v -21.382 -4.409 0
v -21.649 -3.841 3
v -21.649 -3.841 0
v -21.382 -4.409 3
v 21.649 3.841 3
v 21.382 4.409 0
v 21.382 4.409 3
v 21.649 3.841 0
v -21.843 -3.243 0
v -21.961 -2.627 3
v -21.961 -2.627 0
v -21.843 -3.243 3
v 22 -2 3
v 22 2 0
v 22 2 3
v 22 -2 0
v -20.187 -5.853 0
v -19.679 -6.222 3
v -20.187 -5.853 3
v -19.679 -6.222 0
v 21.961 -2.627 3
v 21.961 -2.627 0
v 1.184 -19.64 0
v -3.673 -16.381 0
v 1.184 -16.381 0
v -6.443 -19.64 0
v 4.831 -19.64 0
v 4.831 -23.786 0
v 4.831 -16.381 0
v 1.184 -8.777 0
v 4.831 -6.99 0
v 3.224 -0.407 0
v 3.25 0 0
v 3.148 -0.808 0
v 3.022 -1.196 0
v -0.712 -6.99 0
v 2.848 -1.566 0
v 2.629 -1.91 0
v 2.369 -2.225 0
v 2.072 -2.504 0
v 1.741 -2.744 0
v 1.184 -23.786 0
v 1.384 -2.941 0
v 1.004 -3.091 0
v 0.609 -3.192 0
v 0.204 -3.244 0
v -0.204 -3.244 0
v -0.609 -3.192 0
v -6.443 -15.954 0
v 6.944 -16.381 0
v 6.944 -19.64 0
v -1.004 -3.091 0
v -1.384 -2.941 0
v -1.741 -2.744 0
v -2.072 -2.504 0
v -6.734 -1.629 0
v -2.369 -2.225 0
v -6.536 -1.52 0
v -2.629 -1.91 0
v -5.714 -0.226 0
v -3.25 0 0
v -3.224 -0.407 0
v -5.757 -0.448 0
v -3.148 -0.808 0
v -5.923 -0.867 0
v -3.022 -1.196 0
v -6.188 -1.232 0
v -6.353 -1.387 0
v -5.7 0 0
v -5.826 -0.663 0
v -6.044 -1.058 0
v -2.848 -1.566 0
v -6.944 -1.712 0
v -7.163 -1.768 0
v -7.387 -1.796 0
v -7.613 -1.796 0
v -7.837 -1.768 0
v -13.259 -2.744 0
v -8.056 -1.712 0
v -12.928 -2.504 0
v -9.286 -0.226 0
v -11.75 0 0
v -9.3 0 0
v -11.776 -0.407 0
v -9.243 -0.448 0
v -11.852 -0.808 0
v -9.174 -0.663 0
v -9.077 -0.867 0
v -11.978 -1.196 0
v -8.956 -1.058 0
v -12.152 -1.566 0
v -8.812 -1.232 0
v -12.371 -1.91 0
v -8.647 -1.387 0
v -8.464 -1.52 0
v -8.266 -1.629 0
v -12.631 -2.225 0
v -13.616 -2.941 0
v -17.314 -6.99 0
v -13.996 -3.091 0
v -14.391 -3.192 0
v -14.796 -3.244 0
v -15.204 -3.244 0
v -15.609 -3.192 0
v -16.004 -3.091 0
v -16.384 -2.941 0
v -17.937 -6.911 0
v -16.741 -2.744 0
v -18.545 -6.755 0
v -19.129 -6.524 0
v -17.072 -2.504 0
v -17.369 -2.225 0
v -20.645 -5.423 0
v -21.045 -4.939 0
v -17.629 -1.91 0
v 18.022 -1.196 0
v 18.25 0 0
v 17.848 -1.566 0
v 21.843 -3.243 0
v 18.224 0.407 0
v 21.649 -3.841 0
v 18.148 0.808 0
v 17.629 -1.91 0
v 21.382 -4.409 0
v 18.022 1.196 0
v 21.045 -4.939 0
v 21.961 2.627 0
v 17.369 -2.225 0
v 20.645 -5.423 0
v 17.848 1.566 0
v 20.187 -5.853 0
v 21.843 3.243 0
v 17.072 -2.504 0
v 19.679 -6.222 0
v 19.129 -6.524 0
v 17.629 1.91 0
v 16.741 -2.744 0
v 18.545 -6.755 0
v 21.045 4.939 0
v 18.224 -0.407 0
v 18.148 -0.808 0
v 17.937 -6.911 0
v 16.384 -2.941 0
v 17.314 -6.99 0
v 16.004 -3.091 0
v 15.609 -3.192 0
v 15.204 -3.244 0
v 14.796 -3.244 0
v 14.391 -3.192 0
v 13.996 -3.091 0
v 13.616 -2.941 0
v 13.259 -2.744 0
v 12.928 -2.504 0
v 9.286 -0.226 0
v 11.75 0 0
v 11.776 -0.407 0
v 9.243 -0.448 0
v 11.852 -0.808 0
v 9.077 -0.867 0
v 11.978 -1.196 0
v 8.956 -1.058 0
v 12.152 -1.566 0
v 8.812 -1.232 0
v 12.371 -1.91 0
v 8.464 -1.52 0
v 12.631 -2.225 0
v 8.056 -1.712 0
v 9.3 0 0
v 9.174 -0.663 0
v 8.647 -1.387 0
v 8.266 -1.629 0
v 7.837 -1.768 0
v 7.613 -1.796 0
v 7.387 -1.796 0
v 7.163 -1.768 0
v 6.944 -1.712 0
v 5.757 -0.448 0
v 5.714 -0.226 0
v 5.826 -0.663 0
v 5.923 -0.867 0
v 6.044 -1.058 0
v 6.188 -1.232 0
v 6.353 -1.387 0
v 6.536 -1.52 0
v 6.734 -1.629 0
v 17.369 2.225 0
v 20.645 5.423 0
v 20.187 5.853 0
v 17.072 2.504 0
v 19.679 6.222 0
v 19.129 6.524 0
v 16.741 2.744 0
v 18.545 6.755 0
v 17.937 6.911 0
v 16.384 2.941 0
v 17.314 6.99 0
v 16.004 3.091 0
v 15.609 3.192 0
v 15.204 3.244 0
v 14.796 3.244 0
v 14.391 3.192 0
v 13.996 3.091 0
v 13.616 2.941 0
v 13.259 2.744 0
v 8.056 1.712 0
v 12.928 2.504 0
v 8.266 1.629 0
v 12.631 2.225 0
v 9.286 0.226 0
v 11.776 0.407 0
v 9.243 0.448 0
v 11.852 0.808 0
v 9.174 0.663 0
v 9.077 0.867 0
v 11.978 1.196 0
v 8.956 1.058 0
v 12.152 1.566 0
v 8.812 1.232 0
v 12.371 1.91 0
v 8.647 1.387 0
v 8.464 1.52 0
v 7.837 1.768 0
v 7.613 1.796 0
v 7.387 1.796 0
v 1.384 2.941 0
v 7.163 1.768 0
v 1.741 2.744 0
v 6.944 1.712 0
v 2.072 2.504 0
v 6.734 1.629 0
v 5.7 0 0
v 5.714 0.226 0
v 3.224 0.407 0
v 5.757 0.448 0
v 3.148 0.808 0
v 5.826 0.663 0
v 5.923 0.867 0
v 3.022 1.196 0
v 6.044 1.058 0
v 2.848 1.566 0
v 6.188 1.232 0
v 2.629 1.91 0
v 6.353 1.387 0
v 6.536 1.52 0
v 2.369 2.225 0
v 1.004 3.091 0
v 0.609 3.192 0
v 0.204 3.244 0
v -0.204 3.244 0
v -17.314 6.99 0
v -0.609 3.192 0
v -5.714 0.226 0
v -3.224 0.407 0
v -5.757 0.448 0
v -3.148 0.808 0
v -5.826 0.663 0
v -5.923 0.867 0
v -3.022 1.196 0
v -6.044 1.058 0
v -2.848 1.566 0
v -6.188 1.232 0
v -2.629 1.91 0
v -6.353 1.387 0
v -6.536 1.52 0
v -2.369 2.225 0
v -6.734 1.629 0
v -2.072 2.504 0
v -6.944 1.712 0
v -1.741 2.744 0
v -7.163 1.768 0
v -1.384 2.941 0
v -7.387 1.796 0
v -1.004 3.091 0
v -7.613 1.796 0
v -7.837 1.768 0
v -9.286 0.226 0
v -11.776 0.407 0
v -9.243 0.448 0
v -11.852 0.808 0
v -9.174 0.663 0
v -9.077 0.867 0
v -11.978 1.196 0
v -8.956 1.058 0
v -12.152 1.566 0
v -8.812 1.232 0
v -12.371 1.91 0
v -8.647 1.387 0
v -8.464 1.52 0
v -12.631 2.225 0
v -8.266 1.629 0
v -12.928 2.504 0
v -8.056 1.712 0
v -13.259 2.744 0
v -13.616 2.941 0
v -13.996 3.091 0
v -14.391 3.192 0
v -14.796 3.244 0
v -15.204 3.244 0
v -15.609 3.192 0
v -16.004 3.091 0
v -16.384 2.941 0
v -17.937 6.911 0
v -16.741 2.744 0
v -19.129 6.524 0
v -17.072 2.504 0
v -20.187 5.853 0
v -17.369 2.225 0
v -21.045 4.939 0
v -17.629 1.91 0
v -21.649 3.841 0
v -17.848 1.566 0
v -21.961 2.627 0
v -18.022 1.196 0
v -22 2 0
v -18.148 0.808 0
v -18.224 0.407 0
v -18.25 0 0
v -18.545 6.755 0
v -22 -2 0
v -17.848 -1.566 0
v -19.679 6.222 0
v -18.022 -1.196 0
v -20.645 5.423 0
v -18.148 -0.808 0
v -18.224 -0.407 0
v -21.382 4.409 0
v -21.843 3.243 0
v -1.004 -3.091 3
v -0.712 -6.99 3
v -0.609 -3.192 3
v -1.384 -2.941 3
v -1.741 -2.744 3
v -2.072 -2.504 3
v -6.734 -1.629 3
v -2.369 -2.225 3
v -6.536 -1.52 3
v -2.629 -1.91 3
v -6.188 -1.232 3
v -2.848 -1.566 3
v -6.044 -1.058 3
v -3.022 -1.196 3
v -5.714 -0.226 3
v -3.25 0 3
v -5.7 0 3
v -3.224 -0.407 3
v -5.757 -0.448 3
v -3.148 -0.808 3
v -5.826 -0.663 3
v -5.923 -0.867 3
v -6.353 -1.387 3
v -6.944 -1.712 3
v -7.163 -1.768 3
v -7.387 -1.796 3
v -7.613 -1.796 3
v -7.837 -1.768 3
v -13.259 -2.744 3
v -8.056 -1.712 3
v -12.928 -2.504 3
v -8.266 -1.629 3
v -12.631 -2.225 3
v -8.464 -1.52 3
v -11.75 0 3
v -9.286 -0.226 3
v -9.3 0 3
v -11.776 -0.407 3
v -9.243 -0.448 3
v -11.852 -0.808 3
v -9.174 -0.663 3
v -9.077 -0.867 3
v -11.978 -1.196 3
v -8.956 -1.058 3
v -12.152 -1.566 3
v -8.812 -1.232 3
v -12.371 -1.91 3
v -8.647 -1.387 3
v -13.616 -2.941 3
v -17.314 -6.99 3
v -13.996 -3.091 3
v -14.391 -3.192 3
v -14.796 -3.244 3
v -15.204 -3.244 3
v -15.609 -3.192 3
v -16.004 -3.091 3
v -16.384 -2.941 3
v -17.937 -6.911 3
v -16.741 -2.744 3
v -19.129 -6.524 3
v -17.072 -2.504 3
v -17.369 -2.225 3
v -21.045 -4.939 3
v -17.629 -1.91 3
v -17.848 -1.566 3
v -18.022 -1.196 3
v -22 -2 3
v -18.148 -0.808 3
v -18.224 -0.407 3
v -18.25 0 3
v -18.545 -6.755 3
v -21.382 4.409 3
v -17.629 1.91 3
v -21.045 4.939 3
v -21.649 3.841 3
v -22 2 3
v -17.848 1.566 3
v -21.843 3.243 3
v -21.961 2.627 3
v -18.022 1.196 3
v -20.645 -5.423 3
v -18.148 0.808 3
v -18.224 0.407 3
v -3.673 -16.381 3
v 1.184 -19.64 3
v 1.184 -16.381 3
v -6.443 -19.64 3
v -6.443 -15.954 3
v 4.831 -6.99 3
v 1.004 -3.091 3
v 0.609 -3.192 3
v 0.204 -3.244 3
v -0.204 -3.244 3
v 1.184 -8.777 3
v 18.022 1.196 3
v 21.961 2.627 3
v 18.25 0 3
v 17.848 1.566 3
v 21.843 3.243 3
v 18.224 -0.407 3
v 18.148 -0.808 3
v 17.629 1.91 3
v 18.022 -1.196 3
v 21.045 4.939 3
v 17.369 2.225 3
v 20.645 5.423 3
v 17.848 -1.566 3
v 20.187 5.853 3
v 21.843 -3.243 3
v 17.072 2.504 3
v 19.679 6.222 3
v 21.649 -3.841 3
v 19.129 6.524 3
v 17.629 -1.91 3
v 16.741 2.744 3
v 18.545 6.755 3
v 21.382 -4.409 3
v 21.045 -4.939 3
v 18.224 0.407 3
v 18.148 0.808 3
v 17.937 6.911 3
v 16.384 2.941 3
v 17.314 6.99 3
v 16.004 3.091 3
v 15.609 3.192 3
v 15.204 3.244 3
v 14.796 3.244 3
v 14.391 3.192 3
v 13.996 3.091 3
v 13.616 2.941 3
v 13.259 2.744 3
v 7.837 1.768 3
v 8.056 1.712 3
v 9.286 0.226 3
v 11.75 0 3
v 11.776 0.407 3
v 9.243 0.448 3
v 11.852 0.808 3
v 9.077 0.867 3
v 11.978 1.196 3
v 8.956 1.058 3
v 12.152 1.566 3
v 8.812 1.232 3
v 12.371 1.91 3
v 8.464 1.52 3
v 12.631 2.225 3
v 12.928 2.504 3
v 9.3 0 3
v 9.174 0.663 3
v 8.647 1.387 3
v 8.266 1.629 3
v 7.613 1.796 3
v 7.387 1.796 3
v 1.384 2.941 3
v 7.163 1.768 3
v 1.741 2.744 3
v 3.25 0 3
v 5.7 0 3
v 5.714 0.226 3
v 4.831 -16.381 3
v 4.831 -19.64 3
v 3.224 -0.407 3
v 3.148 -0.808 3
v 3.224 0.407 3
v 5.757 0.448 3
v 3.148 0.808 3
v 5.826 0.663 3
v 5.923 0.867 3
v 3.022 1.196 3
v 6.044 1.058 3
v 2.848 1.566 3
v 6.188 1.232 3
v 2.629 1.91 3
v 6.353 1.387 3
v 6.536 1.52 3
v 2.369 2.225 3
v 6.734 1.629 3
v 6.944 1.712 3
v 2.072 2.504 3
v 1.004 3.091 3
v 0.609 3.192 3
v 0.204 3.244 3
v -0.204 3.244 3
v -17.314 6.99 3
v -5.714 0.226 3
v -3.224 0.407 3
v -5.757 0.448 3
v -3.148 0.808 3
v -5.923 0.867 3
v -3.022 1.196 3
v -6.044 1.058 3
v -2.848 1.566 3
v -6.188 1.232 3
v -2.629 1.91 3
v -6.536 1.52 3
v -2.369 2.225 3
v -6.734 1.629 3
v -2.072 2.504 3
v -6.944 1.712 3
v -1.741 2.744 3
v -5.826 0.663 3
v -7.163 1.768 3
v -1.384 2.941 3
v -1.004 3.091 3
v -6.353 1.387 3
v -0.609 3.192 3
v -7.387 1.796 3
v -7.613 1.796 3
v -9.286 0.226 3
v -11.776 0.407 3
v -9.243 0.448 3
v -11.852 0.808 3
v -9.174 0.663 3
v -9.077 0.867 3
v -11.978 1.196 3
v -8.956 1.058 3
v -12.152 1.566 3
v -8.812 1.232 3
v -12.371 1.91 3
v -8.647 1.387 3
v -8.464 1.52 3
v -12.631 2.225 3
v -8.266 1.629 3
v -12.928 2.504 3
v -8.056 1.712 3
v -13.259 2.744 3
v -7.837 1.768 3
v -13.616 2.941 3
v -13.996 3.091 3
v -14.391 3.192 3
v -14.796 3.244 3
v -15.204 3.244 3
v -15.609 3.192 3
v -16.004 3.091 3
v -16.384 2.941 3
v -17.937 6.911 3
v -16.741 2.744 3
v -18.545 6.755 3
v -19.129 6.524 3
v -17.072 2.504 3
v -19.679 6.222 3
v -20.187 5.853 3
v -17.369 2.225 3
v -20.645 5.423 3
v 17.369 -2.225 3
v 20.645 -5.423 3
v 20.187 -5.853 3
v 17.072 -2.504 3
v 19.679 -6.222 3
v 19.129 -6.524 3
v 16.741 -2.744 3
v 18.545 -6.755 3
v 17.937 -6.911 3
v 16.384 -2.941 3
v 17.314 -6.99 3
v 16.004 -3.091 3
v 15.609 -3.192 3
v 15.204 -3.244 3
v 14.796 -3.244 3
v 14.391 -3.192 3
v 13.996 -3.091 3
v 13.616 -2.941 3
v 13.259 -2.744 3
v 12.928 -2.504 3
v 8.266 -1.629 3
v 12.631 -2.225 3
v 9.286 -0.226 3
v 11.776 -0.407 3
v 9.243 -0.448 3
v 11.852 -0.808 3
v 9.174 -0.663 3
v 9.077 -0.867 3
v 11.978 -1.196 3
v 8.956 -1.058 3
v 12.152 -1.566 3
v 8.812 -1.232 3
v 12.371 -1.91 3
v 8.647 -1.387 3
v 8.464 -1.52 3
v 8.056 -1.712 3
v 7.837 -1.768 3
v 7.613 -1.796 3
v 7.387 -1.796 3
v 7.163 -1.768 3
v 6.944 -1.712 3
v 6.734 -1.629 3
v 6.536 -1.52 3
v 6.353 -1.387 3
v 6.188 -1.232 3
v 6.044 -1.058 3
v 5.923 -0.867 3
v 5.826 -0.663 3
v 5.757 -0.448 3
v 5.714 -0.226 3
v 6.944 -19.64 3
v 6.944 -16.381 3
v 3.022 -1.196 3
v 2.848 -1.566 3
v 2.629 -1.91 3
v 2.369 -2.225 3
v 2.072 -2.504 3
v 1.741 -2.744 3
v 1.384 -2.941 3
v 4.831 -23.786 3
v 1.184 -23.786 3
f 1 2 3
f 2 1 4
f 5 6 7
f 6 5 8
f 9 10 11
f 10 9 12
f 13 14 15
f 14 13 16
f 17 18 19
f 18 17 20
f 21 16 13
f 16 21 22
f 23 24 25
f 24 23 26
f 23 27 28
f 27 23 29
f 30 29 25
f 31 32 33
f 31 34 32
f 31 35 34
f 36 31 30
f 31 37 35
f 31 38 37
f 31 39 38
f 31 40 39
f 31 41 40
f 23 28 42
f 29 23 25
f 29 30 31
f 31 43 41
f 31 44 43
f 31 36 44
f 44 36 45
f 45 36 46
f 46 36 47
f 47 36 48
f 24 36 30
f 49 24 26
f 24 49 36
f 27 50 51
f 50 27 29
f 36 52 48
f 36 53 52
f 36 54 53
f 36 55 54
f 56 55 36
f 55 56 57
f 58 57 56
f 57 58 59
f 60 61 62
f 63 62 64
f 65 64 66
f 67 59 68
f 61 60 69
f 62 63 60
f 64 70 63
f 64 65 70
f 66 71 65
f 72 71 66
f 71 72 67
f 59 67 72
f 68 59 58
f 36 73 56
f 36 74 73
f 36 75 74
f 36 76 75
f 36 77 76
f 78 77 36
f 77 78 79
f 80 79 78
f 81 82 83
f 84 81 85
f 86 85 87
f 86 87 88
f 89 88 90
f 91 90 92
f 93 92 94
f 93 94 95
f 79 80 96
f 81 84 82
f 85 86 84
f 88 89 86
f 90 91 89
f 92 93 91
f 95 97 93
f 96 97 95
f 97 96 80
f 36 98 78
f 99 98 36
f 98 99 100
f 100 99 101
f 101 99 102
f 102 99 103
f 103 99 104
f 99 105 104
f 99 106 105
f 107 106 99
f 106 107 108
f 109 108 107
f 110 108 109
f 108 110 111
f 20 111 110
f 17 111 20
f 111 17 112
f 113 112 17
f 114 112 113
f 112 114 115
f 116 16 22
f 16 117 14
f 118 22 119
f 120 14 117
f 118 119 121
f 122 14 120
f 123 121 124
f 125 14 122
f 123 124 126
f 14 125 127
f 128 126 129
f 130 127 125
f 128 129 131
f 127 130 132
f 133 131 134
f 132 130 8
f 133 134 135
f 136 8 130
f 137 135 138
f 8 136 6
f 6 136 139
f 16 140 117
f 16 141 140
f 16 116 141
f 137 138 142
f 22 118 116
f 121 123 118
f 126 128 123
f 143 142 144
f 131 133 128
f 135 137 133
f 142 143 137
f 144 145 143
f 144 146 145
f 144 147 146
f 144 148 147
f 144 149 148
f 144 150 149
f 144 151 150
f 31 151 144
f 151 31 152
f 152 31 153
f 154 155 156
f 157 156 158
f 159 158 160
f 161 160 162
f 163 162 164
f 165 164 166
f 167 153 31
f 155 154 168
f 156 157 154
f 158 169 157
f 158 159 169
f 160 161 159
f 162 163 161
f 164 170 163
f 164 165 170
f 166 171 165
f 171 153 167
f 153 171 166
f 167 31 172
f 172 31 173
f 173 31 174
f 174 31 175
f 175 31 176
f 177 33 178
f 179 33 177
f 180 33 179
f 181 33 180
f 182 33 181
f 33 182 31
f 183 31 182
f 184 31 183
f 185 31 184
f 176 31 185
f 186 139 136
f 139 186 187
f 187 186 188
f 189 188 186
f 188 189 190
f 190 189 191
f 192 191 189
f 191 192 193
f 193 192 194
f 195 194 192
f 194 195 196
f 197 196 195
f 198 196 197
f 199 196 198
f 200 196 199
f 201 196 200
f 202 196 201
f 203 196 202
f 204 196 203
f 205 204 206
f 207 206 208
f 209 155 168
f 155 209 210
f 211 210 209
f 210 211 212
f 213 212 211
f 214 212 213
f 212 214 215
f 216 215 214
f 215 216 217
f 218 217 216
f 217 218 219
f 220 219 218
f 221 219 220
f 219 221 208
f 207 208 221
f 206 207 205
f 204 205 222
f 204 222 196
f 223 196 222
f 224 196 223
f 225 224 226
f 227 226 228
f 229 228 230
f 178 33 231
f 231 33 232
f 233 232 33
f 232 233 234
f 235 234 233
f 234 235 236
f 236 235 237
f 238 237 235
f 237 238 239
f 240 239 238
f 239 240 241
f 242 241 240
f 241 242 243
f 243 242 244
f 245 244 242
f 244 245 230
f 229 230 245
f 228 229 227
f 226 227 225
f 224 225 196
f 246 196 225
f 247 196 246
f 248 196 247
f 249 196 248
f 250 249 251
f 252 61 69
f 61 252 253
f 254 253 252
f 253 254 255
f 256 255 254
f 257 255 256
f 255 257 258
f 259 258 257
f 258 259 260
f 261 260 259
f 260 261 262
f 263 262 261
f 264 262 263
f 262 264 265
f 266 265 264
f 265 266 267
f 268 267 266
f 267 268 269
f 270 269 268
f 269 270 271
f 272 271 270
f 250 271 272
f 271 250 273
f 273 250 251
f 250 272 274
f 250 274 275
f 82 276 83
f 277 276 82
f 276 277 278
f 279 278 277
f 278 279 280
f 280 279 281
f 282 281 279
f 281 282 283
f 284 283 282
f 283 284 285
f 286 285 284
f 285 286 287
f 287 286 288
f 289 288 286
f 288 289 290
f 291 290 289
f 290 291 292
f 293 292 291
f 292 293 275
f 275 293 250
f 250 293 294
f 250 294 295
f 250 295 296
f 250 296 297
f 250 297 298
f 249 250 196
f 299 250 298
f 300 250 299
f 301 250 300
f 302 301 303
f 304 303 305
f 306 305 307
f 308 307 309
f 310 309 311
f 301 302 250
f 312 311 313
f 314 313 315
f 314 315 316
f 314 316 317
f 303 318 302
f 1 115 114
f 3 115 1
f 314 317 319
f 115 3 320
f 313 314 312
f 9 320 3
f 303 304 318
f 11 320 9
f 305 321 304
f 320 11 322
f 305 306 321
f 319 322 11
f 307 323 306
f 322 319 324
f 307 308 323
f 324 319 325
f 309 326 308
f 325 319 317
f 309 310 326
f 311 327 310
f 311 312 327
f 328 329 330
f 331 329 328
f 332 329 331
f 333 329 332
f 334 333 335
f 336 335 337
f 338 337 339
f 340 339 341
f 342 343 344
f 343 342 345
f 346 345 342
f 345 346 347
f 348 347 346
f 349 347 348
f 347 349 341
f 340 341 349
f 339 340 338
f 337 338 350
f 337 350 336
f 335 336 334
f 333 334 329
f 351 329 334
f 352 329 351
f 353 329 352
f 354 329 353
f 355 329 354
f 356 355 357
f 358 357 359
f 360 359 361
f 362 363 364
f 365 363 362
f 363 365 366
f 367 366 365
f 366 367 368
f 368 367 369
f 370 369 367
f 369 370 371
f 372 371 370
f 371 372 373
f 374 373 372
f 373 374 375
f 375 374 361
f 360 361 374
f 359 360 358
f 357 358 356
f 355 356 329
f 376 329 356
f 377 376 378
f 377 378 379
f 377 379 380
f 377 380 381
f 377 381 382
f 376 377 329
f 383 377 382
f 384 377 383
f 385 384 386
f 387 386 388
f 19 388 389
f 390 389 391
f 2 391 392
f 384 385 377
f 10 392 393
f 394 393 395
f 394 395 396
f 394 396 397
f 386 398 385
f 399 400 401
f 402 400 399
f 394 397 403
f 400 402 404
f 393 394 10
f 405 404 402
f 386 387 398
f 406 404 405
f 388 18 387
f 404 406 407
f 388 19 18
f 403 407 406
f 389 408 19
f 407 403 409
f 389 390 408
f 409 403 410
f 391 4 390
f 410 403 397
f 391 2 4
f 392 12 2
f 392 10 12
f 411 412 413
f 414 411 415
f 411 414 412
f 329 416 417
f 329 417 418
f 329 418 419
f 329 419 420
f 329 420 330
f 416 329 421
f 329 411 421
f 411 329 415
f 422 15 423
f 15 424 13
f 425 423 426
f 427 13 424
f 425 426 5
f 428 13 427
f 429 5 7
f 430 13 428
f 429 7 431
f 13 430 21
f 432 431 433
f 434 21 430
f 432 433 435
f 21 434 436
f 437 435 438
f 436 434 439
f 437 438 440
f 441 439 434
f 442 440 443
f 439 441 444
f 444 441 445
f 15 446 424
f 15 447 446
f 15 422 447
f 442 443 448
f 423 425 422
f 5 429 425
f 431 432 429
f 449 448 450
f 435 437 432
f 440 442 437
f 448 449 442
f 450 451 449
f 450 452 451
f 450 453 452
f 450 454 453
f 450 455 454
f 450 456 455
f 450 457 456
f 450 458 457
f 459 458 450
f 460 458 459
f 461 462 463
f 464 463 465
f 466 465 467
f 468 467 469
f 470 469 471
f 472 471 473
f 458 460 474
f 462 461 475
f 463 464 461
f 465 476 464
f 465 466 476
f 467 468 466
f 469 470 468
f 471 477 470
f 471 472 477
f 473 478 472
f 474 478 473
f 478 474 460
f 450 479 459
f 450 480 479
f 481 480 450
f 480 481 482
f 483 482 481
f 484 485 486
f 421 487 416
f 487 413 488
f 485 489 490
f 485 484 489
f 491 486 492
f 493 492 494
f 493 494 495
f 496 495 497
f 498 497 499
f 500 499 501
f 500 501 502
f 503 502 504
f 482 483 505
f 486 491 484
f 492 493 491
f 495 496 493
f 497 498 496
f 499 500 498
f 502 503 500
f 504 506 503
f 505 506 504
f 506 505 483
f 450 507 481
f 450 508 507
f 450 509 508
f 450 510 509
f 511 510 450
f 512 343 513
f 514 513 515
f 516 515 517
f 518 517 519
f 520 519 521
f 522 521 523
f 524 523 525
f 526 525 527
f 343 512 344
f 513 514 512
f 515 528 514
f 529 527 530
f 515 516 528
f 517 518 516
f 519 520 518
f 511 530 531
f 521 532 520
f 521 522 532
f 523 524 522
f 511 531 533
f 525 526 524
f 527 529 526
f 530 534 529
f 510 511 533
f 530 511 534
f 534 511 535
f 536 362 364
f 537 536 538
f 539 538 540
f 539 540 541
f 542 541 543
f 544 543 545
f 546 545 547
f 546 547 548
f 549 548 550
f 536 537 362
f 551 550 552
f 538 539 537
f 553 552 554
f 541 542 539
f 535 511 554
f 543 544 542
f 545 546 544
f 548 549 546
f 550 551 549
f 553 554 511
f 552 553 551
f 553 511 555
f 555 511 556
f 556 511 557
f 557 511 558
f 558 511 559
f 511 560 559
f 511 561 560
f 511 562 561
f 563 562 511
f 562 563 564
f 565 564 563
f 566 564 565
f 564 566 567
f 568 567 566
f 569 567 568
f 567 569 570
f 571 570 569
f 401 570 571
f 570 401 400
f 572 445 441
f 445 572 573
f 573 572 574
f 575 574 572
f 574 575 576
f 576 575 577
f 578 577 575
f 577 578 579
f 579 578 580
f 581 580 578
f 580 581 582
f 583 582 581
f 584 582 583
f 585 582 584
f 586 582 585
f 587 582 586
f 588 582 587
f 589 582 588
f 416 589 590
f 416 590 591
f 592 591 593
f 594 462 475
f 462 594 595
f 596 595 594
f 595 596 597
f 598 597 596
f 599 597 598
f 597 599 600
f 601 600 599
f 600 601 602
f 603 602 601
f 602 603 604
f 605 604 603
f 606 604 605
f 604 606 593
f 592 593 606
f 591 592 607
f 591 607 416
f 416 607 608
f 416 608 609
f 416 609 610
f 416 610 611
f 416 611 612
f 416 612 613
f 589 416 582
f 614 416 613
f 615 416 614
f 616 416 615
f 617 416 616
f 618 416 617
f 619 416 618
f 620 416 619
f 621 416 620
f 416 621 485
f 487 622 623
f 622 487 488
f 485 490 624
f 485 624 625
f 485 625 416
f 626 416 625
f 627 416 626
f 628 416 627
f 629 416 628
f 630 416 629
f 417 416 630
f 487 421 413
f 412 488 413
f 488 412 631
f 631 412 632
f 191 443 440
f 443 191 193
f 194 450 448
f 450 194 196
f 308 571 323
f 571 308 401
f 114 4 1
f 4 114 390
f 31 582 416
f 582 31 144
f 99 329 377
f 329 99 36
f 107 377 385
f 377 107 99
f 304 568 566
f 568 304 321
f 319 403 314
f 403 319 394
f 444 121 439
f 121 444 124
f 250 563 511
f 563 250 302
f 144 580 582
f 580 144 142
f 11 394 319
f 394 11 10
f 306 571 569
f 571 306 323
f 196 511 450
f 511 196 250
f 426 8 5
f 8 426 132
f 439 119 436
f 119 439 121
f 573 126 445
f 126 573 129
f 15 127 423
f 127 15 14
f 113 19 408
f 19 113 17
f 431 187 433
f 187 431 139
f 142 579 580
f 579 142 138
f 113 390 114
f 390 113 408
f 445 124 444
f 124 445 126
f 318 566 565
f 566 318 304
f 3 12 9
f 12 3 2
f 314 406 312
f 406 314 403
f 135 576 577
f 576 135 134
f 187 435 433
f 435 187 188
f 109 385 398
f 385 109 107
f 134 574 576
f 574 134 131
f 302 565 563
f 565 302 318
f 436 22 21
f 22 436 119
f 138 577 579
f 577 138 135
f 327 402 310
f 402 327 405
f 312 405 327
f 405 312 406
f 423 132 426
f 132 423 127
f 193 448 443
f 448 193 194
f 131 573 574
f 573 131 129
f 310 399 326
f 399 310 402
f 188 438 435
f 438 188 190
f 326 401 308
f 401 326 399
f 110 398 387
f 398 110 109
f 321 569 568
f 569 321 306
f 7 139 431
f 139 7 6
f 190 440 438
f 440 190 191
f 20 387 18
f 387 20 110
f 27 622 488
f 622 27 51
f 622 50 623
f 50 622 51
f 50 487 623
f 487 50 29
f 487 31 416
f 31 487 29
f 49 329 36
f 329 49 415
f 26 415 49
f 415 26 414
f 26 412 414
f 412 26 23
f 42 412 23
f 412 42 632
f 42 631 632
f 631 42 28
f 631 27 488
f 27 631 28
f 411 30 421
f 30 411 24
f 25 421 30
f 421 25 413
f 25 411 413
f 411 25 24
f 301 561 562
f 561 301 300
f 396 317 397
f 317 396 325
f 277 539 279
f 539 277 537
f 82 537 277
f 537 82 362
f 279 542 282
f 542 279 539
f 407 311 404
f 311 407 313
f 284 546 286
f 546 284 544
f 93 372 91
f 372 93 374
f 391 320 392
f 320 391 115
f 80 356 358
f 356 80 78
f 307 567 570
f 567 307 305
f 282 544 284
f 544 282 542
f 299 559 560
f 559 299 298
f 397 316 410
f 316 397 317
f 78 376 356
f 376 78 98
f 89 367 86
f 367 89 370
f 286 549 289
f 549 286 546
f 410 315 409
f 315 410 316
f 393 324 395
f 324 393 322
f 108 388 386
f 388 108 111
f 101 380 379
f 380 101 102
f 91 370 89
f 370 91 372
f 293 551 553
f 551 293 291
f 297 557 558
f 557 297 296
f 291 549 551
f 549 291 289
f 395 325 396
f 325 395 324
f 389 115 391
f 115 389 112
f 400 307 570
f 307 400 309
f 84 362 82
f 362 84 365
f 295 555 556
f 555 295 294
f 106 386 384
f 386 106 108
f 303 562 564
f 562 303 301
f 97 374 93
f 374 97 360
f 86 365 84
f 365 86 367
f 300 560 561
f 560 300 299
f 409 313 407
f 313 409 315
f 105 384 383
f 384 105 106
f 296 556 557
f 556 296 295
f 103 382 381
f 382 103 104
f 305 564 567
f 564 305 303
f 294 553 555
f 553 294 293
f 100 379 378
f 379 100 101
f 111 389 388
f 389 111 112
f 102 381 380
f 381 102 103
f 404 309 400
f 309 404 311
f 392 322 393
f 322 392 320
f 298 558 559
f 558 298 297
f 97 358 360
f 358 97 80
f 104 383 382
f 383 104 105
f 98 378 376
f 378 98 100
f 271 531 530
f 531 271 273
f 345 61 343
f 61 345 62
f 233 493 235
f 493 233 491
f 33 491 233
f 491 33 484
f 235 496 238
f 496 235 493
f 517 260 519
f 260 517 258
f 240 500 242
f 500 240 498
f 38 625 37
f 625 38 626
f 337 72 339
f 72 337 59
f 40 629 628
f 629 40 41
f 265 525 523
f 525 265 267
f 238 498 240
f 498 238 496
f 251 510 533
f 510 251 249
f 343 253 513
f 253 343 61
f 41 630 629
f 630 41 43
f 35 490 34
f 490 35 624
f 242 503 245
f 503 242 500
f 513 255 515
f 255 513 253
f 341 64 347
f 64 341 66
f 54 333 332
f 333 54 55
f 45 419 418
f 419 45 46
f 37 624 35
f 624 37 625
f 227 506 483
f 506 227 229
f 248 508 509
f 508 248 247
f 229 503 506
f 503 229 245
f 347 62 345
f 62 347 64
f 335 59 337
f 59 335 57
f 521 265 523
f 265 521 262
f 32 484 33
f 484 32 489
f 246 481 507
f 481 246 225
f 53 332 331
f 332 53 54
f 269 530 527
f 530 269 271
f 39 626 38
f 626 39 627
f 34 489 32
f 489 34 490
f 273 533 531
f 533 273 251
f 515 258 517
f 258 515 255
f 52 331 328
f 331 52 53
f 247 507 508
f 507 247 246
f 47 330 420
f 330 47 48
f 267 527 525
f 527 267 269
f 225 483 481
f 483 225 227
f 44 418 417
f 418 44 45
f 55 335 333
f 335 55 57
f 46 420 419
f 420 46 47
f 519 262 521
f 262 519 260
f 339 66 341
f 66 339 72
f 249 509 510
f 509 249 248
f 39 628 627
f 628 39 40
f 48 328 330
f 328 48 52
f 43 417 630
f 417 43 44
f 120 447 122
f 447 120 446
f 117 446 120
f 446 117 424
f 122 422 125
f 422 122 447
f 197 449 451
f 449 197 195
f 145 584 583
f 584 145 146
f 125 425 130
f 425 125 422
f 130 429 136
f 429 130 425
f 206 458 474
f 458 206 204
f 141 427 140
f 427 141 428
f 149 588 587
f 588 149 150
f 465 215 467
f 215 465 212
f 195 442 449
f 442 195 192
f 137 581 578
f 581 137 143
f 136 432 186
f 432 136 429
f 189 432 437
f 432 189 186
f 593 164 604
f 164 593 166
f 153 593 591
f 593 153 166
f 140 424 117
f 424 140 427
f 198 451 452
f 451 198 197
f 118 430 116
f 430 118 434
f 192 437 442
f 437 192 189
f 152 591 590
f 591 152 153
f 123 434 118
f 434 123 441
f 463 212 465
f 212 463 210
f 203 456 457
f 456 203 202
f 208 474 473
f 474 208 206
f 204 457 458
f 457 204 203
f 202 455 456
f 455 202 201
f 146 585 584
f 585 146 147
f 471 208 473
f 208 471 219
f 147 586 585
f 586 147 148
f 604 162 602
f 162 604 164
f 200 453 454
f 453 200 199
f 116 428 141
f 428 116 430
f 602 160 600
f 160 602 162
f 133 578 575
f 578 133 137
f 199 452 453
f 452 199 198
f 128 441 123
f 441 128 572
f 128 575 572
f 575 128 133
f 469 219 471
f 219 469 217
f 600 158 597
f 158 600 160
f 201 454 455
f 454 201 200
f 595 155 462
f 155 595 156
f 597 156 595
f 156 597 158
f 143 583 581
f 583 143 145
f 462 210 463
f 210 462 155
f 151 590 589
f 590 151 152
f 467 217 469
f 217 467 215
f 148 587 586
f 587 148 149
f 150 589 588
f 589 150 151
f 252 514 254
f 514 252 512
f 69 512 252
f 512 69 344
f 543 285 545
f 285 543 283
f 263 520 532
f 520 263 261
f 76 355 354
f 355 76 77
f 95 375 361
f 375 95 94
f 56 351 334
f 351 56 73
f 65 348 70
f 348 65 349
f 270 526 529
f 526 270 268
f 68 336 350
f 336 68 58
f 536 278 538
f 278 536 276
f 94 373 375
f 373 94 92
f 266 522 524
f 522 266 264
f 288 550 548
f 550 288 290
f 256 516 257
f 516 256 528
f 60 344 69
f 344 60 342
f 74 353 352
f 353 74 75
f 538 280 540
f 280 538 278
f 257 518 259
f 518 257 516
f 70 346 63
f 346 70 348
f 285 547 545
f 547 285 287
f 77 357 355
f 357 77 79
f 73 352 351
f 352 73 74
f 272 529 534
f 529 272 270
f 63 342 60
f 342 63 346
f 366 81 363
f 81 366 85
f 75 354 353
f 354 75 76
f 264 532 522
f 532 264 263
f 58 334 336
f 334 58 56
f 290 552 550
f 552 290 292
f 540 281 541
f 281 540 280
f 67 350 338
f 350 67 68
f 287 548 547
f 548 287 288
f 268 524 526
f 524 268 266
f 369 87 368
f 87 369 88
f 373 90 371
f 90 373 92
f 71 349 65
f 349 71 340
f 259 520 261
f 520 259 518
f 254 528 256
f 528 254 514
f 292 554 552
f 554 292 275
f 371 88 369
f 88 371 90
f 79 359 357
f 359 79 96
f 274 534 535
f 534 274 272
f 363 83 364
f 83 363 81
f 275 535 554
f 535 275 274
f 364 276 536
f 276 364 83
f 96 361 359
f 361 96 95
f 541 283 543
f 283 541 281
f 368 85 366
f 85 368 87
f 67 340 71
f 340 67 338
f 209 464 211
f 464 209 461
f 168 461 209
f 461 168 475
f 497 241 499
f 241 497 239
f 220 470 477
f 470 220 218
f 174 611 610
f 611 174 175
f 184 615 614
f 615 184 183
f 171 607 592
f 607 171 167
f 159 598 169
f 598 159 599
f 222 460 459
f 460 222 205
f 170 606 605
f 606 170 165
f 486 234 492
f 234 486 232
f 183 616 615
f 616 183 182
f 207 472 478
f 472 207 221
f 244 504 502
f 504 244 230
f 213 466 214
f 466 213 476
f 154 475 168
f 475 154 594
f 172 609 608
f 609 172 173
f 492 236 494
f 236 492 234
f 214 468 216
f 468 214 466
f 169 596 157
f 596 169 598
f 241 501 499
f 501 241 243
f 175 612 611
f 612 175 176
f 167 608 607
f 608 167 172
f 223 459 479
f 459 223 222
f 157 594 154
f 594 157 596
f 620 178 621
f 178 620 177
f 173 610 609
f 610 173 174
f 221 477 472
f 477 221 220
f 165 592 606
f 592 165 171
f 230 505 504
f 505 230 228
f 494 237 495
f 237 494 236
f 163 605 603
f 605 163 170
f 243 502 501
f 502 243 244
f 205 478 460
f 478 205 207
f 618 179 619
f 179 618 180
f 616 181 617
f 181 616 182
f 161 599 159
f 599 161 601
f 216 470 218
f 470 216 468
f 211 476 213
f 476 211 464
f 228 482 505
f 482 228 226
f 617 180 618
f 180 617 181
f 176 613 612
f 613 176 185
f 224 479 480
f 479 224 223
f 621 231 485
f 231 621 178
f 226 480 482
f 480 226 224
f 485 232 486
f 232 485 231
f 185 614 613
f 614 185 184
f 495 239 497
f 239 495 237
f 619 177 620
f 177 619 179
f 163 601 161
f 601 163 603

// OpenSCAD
$fn = 50;


difference() {
	union() {
		hull() {
			translate(v = [-17.0000000000, 2.0000000000, 0]) {
				cylinder(h = 3, r = 5);
			}
			translate(v = [17.0000000000, 2.0000000000, 0]) {
				cylinder(h = 3, r = 5);
			}
			translate(v = [-17.0000000000, -2.0000000000, 0]) {
				cylinder(h = 3, r = 5);
			}
			translate(v = [17.0000000000, -2.0000000000, 0]) {
				cylinder(h = 3, r = 5);
			}
		}
		translate(v = [0, -5, 0]) {
			linear_extrude(height = 3) {
				text(font = "DejaVu Sans Mono:style=Bold", halign = "center", size = 19.0000000000, text = "4", valign = "top");
			}
		}
	}
	union() {
		translate(v = [-15.0000000000, 0.0000000000, 0]) {
			translate(v = [0, 0, -100]) {
				cylinder(h = 200, r = 3.2500000000);
			}
		}
		translate(v = [0, 0, -100]) {
			cylinder(h = 200, r = 3.2500000000);
		}
		translate(v = [15.0000000000, 0.0000000000, 0]) {
			translate(v = [0, 0, -100]) {
				cylinder(h = 200, r = 3.2500000000);
			}
		}
		translate(v = [-15.0000000000, 0.0000000000, 0]) {
			translate(v = [0, 0, -100]) {
				cylinder(h = 200, r = 1.8000000000);
			}
		}
		translate(v = [-7.5000000000, 0.0000000000, 0]) {
			translate(v = [0, 0, -100]) {
				cylinder(h = 200, r = 1.8000000000);
			}
		}
		translate(v = [0, 0, -100]) {
			cylinder(h = 200, r = 1.8000000000);
		}
		translate(v = [7.5000000000, 0.0000000000, 0]) {
			translate(v = [0, 0, -100]) {
				cylinder(h = 200, r = 1.8000000000);
			}
		}
		translate(v = [15.0000000000, 0.0000000000, 0]) {
			translate(v = [0, 0, -100]) {
				cylinder(h = 200, r = 1.8000000000);
			}
		}
	}
}
